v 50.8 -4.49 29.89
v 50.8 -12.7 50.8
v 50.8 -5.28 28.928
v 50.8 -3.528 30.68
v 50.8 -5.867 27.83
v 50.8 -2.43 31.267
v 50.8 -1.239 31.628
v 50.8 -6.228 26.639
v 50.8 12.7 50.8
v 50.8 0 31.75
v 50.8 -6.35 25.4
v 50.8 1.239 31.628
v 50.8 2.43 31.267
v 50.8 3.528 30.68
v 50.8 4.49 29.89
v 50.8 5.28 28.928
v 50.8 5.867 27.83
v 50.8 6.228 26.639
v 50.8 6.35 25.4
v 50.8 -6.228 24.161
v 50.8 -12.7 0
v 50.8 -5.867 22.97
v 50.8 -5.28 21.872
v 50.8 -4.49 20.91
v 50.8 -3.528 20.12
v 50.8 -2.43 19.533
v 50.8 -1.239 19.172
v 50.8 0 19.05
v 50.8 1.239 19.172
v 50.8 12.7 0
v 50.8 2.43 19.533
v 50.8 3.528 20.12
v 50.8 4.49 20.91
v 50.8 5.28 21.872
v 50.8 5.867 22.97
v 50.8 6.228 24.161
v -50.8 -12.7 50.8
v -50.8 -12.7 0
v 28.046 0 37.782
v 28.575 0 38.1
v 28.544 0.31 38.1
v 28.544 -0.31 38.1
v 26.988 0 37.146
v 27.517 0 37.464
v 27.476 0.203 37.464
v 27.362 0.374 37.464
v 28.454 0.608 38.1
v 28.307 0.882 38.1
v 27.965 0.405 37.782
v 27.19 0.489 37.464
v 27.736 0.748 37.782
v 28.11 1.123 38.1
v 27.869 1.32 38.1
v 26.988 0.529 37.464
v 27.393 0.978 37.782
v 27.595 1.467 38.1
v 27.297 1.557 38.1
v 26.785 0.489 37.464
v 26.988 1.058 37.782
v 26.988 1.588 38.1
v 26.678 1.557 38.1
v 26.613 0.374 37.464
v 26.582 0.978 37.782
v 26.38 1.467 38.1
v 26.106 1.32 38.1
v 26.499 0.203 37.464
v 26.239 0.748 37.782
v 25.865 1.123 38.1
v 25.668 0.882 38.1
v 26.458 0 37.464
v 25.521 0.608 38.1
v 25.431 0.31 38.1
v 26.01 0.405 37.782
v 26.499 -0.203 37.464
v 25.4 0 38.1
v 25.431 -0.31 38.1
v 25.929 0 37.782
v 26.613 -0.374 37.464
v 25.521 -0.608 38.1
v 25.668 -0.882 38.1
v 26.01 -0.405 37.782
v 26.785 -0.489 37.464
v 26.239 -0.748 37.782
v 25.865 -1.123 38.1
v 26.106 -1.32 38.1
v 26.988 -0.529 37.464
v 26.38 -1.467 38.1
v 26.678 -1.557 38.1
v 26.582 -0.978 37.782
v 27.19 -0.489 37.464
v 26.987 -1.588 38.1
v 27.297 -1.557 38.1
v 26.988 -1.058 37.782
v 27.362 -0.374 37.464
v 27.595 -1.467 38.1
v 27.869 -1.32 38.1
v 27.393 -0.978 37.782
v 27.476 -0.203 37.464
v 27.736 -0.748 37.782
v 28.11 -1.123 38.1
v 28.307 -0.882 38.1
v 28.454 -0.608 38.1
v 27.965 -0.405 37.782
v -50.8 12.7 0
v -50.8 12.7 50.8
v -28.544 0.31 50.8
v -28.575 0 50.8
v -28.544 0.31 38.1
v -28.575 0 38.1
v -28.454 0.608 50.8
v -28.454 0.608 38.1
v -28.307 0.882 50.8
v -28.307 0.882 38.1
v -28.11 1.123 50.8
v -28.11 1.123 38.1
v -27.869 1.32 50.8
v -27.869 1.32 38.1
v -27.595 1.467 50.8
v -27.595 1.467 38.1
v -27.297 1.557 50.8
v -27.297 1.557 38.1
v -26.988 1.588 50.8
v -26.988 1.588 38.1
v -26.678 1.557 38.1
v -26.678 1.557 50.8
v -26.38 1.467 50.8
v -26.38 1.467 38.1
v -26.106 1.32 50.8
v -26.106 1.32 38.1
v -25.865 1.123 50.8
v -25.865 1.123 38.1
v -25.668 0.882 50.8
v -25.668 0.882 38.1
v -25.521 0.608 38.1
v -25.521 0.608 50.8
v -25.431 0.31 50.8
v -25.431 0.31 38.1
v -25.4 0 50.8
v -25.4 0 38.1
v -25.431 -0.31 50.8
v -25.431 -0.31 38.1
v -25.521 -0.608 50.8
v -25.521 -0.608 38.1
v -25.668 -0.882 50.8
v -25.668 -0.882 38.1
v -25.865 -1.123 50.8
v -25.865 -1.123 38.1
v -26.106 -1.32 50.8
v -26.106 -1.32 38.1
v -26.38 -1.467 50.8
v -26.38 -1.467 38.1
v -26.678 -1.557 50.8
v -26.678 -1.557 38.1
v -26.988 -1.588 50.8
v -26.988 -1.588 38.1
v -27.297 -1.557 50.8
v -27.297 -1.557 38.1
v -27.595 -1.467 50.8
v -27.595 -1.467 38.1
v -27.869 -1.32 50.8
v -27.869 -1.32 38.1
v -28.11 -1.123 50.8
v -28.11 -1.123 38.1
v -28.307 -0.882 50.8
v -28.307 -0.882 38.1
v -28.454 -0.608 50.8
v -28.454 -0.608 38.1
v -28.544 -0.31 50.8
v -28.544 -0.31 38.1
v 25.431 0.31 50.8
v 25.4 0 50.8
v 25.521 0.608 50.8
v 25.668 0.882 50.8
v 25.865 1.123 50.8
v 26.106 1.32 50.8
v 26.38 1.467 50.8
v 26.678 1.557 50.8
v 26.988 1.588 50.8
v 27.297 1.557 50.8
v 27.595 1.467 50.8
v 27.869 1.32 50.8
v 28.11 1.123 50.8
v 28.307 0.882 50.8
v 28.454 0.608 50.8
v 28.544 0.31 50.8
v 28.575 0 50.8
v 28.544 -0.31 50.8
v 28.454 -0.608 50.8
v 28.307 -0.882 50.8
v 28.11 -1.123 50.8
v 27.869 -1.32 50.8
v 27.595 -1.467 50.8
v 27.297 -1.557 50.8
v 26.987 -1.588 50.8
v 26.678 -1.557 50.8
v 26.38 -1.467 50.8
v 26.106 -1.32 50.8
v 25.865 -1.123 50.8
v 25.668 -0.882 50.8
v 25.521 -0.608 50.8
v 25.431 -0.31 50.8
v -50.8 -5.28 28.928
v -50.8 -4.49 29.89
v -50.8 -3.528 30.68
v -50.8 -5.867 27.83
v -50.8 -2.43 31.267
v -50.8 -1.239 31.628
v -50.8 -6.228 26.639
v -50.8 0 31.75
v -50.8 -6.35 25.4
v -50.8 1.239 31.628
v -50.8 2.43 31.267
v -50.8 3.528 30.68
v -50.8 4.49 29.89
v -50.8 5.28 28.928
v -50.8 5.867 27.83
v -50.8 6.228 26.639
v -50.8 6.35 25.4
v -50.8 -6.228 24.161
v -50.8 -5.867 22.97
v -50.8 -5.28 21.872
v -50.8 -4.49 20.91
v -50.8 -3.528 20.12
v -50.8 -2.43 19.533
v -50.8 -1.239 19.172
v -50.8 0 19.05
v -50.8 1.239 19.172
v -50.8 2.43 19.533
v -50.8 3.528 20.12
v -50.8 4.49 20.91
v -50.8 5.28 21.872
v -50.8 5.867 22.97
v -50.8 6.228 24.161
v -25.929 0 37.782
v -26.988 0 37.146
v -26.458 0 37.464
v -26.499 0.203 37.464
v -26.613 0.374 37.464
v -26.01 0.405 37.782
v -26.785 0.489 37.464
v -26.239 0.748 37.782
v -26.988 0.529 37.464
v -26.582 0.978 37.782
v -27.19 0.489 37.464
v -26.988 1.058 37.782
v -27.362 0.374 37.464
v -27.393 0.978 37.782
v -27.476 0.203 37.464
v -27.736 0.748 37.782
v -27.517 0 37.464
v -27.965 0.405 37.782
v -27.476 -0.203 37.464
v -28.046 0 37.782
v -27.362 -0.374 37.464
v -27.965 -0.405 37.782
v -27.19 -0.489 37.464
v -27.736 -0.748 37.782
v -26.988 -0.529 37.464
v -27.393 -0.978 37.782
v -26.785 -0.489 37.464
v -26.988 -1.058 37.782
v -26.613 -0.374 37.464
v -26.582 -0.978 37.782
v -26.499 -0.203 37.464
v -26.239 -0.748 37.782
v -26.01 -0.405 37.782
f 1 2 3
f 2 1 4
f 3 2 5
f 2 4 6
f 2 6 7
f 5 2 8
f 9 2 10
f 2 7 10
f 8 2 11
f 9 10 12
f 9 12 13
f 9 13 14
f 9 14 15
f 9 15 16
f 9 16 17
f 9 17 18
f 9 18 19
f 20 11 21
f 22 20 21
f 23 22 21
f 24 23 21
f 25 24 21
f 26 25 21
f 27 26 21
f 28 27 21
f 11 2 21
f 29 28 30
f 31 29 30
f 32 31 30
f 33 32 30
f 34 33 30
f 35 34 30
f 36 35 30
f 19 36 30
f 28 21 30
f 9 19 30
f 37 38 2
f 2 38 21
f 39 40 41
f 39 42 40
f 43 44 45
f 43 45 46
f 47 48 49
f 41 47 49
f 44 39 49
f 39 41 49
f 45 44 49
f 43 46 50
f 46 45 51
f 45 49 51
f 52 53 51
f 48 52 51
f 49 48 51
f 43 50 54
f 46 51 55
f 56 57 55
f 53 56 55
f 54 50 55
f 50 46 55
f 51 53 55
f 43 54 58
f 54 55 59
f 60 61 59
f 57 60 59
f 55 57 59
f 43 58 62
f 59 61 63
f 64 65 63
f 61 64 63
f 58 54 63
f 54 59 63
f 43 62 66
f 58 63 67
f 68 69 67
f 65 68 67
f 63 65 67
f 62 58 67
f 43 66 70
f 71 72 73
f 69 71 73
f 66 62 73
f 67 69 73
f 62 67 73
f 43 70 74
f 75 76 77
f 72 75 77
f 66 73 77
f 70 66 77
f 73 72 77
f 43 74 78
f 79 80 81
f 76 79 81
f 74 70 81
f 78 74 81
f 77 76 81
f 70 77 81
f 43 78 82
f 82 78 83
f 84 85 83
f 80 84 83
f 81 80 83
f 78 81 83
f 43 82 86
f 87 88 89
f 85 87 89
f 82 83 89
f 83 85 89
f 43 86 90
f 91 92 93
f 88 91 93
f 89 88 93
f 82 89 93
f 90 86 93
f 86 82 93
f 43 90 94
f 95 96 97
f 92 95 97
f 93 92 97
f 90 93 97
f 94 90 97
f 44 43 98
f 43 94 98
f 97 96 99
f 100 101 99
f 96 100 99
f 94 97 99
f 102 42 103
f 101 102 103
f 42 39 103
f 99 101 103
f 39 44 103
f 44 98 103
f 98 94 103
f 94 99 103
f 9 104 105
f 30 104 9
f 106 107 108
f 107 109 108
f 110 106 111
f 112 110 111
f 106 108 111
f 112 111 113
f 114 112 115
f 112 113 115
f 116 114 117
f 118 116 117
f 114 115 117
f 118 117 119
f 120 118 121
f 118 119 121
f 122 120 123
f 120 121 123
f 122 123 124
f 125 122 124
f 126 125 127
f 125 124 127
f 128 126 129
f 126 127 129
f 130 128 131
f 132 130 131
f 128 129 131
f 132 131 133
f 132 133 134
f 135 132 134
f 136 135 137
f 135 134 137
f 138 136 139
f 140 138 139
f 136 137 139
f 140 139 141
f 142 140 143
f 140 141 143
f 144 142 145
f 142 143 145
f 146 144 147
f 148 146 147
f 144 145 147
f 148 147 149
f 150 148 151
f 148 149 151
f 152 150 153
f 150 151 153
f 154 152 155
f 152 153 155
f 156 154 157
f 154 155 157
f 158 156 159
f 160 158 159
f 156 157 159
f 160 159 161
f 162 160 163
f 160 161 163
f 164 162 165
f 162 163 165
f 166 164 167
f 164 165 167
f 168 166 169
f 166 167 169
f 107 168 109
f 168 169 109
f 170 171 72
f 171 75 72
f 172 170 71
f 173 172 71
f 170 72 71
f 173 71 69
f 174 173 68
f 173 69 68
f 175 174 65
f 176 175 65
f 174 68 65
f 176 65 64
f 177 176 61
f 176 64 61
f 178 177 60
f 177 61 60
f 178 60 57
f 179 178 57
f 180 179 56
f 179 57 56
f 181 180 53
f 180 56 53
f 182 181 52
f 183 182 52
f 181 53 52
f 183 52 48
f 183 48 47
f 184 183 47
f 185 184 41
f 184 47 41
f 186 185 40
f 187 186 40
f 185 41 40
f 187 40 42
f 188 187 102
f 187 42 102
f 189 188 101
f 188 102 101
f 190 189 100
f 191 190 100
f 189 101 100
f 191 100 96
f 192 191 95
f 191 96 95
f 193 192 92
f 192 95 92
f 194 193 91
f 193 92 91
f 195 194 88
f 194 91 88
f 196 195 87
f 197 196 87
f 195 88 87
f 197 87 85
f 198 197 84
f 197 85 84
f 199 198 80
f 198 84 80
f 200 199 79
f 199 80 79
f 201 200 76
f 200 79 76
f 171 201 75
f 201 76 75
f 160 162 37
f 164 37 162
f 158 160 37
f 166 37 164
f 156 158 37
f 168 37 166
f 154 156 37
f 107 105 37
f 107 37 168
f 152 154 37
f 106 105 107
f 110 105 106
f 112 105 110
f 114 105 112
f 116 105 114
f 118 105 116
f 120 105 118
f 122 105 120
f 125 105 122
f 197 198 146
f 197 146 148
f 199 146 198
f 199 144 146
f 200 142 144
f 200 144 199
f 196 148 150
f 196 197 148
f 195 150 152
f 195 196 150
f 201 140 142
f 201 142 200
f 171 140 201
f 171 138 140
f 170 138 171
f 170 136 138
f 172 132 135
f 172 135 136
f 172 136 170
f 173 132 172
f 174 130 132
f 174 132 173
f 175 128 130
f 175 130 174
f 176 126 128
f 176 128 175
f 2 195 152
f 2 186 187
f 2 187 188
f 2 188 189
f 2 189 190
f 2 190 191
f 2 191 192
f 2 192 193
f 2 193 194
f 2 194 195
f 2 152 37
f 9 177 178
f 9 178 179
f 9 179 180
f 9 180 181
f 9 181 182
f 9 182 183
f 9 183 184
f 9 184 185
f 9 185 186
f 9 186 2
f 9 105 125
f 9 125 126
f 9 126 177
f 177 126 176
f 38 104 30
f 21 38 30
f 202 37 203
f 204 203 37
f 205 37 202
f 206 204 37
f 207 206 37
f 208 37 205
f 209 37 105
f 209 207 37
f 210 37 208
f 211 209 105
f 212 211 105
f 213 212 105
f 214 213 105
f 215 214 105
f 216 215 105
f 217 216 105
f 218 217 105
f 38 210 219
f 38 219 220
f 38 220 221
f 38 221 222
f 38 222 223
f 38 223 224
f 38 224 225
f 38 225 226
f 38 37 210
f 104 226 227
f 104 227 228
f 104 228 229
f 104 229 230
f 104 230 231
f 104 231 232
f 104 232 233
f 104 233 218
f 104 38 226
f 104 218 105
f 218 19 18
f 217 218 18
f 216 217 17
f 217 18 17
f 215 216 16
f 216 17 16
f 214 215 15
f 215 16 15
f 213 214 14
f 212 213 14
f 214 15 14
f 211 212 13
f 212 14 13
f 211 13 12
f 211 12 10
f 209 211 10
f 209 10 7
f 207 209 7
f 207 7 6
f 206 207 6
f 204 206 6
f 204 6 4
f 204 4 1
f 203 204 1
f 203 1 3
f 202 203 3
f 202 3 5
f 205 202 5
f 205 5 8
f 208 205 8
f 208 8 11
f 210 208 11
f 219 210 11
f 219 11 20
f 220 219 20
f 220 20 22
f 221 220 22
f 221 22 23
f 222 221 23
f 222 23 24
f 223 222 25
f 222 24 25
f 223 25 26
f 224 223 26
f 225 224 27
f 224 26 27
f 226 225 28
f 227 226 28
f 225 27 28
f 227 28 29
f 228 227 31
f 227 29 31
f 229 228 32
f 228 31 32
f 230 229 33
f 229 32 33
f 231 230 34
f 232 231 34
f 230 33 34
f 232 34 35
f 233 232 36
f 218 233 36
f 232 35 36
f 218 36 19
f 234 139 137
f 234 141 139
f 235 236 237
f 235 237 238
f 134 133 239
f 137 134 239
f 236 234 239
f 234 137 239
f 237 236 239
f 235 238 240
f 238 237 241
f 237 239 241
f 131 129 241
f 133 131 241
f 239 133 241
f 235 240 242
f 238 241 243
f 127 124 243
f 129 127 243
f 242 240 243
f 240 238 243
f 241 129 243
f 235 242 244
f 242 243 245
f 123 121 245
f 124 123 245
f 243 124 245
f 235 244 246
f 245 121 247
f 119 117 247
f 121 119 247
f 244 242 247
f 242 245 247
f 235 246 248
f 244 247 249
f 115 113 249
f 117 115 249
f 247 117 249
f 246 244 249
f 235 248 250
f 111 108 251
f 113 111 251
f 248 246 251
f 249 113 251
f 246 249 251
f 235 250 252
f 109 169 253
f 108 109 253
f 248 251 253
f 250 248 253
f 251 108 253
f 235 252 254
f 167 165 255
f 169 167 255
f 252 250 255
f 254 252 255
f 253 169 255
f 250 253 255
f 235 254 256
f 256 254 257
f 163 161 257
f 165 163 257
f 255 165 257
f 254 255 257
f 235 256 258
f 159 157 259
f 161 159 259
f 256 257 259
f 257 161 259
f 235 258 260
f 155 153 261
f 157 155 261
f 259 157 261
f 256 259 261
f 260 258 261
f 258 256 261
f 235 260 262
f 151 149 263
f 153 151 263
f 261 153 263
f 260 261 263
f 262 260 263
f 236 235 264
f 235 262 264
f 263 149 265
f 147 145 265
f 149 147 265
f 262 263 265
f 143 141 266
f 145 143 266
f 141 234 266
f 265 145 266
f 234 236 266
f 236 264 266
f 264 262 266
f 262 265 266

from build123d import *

# Parameters (mm, degrees)
F0_W     = 101.6
F0_H     = 25.4
F1_DEPTH = 50.8
F3_D     = 3.175
F3_DEPTH = 12.7
F3_TIP   = 0.9538662327
F5_D     = 12.7


with BuildPart() as f1:
    # F0 (on Top) → F1 (new body)
    with BuildSketch(Plane.XY):
        Rectangle(F0_W, F0_H)
    extrude(amount=F1_DEPTH)

    # F3
    with Locations(Plane.XY.offset(50.8)):
        with Locations((-26.9875, 0), (26.9875, 0)):
            Hole(F3_D / 2, depth=F3_DEPTH)
            with Locations((0, 0, -(F3_DEPTH + F3_TIP / 2))):  # 118° drill point
                Cone(0, F3_D / 2, F3_TIP, mode=Mode.SUBTRACT)

    # F5 (through all)
    with Locations(Plane(origin=(-50.8, 0, 0), x_dir=(0, -1, 0), z_dir=(-1, 0, 0))):
        with Locations((0, 25.4)):
            Hole(F5_D / 2)


solid = f1.part
